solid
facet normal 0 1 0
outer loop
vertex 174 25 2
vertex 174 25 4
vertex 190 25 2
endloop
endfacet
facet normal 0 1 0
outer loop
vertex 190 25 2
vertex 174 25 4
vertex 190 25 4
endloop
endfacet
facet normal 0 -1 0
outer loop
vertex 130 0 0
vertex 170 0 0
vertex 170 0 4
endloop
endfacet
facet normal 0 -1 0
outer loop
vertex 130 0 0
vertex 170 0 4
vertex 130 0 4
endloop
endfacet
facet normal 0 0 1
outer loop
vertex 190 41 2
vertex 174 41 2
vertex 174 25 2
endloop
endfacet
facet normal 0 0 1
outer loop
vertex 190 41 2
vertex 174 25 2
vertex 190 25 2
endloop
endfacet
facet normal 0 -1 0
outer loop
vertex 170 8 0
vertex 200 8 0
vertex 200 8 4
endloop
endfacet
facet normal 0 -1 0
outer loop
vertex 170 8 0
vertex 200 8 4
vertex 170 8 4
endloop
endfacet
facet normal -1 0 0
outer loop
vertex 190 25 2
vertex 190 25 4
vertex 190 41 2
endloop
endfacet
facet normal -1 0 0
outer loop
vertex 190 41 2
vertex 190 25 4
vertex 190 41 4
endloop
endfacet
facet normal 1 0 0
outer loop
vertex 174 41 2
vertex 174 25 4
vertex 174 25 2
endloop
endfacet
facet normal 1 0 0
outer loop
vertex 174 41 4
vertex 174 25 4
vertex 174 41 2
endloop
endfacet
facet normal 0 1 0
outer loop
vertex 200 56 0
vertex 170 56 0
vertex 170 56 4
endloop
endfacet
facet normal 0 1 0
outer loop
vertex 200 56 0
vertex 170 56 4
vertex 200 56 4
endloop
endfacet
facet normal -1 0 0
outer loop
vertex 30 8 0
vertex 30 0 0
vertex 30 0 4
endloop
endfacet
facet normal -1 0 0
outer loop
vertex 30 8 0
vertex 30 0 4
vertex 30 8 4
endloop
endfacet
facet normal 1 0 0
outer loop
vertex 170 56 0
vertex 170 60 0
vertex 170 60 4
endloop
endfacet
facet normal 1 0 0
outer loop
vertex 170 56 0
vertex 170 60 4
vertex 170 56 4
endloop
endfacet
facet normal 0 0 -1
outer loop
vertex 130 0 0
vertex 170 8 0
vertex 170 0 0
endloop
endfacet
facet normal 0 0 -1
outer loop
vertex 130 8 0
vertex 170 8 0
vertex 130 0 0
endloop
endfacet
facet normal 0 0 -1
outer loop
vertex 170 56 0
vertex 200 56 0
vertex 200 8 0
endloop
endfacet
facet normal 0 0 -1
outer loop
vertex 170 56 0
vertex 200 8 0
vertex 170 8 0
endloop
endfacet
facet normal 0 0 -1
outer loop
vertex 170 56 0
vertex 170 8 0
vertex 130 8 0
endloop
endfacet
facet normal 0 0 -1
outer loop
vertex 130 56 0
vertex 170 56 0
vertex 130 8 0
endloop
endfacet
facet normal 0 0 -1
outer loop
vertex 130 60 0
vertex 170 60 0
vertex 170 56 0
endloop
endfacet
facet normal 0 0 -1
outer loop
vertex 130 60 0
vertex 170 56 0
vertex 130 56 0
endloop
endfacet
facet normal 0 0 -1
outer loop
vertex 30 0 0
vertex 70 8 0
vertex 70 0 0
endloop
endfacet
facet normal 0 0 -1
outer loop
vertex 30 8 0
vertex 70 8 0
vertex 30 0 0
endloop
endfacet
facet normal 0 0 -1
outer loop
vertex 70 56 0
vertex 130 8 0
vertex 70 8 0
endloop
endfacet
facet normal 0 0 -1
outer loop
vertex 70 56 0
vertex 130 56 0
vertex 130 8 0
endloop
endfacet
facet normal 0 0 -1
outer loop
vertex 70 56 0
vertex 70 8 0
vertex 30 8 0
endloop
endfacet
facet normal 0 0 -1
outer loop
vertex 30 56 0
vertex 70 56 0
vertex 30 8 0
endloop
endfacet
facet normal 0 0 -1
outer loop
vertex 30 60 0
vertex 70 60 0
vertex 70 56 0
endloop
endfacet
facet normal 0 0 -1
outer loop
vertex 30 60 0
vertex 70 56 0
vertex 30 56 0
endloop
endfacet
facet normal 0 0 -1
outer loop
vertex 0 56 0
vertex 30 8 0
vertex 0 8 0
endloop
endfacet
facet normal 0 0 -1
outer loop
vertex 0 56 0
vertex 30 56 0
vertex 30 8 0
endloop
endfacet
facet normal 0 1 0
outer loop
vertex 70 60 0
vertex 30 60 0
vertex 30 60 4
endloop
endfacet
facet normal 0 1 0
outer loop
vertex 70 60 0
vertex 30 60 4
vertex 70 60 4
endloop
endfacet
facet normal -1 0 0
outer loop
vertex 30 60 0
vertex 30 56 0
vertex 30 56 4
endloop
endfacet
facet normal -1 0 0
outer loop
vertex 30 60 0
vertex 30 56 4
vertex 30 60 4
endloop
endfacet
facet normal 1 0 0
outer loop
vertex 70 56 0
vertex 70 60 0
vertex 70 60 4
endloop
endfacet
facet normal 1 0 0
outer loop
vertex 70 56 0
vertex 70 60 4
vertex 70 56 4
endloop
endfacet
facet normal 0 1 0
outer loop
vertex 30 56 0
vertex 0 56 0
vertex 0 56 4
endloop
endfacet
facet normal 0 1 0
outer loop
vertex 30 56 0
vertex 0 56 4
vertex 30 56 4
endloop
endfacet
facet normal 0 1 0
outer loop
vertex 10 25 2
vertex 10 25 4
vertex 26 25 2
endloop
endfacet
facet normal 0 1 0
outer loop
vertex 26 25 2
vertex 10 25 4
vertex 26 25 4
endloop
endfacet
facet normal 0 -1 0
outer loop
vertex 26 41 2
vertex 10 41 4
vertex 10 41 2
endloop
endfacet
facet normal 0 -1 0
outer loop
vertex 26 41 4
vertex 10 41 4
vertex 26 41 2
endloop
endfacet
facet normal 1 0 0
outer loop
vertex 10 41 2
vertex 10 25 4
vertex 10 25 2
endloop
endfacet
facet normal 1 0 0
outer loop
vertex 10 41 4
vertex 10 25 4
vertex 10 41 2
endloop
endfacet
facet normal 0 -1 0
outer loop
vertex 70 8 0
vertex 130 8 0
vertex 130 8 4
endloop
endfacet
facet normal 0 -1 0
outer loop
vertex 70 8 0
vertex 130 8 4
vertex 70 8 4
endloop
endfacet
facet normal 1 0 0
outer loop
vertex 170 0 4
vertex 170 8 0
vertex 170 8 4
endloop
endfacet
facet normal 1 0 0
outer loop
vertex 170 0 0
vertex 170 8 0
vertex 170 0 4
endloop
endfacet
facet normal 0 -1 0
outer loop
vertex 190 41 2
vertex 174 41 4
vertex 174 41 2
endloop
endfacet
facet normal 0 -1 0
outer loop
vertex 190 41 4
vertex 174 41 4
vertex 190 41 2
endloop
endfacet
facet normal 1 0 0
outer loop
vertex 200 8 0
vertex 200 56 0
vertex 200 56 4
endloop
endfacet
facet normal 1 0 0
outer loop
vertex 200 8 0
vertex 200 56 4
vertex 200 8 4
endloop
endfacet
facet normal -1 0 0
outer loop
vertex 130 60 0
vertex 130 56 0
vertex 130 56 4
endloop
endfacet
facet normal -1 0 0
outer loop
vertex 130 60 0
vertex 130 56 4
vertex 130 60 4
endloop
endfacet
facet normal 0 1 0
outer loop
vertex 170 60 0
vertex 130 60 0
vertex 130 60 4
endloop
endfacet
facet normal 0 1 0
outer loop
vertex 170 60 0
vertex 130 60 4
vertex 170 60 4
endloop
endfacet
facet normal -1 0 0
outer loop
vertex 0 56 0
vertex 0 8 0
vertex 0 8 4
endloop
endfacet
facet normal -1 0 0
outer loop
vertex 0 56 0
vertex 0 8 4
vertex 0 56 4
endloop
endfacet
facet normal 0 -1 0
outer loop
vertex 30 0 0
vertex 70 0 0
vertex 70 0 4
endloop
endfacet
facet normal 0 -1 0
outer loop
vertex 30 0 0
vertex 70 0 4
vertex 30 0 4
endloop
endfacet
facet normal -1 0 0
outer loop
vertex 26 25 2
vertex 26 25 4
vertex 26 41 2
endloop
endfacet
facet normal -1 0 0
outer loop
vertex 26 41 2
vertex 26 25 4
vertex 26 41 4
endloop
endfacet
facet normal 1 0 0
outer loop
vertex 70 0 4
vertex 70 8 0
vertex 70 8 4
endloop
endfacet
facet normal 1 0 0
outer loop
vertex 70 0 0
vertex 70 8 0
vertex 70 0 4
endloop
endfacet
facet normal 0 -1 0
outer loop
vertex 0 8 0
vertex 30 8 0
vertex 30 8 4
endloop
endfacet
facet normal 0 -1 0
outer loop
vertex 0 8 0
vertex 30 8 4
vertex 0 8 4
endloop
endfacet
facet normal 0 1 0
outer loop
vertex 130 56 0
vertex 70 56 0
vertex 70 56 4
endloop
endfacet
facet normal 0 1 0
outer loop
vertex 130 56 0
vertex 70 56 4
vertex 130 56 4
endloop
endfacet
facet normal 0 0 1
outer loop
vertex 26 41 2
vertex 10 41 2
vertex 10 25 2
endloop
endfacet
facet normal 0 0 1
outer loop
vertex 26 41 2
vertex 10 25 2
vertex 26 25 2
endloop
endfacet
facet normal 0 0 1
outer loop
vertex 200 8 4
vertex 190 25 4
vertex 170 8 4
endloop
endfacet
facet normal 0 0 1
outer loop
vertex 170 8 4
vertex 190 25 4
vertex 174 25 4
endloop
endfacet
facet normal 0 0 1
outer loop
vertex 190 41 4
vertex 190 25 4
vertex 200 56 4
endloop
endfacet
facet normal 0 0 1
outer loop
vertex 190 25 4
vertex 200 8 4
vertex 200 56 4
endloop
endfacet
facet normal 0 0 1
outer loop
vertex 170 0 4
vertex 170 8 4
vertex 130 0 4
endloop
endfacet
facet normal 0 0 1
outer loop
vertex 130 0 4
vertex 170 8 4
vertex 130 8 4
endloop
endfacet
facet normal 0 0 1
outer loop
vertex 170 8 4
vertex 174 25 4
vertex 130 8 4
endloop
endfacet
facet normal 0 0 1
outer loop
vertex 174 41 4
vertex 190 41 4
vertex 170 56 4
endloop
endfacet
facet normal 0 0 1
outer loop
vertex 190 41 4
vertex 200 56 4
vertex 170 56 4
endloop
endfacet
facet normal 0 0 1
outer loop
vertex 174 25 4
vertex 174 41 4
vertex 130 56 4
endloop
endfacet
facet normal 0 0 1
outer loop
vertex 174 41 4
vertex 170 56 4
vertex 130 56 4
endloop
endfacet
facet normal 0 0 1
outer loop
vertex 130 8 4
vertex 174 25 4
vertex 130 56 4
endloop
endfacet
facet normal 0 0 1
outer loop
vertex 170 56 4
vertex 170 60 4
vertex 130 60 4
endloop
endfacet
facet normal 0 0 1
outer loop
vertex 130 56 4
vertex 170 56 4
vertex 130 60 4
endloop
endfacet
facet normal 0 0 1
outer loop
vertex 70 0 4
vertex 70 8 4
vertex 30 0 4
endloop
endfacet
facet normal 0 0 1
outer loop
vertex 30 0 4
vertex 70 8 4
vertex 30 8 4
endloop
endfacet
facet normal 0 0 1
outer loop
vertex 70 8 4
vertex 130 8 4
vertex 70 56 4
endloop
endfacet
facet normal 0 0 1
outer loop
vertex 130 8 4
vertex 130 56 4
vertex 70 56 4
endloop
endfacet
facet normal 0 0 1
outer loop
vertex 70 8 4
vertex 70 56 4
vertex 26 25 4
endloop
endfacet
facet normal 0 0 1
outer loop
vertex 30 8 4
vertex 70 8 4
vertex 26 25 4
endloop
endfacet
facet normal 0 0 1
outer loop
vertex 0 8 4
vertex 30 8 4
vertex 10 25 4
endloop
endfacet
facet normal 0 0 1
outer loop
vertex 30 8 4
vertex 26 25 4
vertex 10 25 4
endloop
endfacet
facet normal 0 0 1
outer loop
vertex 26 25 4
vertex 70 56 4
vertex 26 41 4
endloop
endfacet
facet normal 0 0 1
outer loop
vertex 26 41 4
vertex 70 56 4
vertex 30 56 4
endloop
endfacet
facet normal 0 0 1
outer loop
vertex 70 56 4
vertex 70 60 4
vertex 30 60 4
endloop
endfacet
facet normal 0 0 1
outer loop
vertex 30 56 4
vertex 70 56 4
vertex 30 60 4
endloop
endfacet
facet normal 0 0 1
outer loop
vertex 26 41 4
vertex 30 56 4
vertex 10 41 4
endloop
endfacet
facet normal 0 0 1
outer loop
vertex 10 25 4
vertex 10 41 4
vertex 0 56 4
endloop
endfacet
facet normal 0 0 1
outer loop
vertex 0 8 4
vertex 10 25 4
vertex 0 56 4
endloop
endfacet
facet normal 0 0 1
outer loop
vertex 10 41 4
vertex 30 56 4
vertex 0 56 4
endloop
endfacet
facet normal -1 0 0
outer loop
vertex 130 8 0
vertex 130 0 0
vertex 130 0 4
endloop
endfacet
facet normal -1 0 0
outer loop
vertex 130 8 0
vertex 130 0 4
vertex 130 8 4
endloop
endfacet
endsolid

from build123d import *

# Parameters (mm, degrees)
BOSS_EXTRUDE1_DEPTH = 4
SKETCH2_W           = 16
SKETCH2_H           = 16
CUT_EXTRUDE1_DEPTH  = 2


with BuildPart() as part:
    # Sketch1 → Boss-Extrude1 (new body)
    with BuildSketch(Plane.XY):
        Polygon((30, 60), (70, 60), (70, 56), (130, 56), (130, 60), (170, 60), (170, 56), (200, 56), (200, 8), (170, 8), (170, 0), (130, 0), (130, 8), (70, 8), (70, 0), (30, 0), (30, 8), (0, 8), (0, 56), (30, 56), align=None)
    extrude(amount=BOSS_EXTRUDE1_DEPTH)

    # Sketch2 → Cut-Extrude1 (cut)
    with BuildSketch(Plane.XY.offset(4)):
        with Locations((18, 33)):
            Rectangle(SKETCH2_W, SKETCH2_H)
        with Locations((182, 33)):
            Rectangle(SKETCH2_W, SKETCH2_H)
    extrude(amount=-CUT_EXTRUDE1_DEPTH, mode=Mode.SUBTRACT)


solid = part.part
